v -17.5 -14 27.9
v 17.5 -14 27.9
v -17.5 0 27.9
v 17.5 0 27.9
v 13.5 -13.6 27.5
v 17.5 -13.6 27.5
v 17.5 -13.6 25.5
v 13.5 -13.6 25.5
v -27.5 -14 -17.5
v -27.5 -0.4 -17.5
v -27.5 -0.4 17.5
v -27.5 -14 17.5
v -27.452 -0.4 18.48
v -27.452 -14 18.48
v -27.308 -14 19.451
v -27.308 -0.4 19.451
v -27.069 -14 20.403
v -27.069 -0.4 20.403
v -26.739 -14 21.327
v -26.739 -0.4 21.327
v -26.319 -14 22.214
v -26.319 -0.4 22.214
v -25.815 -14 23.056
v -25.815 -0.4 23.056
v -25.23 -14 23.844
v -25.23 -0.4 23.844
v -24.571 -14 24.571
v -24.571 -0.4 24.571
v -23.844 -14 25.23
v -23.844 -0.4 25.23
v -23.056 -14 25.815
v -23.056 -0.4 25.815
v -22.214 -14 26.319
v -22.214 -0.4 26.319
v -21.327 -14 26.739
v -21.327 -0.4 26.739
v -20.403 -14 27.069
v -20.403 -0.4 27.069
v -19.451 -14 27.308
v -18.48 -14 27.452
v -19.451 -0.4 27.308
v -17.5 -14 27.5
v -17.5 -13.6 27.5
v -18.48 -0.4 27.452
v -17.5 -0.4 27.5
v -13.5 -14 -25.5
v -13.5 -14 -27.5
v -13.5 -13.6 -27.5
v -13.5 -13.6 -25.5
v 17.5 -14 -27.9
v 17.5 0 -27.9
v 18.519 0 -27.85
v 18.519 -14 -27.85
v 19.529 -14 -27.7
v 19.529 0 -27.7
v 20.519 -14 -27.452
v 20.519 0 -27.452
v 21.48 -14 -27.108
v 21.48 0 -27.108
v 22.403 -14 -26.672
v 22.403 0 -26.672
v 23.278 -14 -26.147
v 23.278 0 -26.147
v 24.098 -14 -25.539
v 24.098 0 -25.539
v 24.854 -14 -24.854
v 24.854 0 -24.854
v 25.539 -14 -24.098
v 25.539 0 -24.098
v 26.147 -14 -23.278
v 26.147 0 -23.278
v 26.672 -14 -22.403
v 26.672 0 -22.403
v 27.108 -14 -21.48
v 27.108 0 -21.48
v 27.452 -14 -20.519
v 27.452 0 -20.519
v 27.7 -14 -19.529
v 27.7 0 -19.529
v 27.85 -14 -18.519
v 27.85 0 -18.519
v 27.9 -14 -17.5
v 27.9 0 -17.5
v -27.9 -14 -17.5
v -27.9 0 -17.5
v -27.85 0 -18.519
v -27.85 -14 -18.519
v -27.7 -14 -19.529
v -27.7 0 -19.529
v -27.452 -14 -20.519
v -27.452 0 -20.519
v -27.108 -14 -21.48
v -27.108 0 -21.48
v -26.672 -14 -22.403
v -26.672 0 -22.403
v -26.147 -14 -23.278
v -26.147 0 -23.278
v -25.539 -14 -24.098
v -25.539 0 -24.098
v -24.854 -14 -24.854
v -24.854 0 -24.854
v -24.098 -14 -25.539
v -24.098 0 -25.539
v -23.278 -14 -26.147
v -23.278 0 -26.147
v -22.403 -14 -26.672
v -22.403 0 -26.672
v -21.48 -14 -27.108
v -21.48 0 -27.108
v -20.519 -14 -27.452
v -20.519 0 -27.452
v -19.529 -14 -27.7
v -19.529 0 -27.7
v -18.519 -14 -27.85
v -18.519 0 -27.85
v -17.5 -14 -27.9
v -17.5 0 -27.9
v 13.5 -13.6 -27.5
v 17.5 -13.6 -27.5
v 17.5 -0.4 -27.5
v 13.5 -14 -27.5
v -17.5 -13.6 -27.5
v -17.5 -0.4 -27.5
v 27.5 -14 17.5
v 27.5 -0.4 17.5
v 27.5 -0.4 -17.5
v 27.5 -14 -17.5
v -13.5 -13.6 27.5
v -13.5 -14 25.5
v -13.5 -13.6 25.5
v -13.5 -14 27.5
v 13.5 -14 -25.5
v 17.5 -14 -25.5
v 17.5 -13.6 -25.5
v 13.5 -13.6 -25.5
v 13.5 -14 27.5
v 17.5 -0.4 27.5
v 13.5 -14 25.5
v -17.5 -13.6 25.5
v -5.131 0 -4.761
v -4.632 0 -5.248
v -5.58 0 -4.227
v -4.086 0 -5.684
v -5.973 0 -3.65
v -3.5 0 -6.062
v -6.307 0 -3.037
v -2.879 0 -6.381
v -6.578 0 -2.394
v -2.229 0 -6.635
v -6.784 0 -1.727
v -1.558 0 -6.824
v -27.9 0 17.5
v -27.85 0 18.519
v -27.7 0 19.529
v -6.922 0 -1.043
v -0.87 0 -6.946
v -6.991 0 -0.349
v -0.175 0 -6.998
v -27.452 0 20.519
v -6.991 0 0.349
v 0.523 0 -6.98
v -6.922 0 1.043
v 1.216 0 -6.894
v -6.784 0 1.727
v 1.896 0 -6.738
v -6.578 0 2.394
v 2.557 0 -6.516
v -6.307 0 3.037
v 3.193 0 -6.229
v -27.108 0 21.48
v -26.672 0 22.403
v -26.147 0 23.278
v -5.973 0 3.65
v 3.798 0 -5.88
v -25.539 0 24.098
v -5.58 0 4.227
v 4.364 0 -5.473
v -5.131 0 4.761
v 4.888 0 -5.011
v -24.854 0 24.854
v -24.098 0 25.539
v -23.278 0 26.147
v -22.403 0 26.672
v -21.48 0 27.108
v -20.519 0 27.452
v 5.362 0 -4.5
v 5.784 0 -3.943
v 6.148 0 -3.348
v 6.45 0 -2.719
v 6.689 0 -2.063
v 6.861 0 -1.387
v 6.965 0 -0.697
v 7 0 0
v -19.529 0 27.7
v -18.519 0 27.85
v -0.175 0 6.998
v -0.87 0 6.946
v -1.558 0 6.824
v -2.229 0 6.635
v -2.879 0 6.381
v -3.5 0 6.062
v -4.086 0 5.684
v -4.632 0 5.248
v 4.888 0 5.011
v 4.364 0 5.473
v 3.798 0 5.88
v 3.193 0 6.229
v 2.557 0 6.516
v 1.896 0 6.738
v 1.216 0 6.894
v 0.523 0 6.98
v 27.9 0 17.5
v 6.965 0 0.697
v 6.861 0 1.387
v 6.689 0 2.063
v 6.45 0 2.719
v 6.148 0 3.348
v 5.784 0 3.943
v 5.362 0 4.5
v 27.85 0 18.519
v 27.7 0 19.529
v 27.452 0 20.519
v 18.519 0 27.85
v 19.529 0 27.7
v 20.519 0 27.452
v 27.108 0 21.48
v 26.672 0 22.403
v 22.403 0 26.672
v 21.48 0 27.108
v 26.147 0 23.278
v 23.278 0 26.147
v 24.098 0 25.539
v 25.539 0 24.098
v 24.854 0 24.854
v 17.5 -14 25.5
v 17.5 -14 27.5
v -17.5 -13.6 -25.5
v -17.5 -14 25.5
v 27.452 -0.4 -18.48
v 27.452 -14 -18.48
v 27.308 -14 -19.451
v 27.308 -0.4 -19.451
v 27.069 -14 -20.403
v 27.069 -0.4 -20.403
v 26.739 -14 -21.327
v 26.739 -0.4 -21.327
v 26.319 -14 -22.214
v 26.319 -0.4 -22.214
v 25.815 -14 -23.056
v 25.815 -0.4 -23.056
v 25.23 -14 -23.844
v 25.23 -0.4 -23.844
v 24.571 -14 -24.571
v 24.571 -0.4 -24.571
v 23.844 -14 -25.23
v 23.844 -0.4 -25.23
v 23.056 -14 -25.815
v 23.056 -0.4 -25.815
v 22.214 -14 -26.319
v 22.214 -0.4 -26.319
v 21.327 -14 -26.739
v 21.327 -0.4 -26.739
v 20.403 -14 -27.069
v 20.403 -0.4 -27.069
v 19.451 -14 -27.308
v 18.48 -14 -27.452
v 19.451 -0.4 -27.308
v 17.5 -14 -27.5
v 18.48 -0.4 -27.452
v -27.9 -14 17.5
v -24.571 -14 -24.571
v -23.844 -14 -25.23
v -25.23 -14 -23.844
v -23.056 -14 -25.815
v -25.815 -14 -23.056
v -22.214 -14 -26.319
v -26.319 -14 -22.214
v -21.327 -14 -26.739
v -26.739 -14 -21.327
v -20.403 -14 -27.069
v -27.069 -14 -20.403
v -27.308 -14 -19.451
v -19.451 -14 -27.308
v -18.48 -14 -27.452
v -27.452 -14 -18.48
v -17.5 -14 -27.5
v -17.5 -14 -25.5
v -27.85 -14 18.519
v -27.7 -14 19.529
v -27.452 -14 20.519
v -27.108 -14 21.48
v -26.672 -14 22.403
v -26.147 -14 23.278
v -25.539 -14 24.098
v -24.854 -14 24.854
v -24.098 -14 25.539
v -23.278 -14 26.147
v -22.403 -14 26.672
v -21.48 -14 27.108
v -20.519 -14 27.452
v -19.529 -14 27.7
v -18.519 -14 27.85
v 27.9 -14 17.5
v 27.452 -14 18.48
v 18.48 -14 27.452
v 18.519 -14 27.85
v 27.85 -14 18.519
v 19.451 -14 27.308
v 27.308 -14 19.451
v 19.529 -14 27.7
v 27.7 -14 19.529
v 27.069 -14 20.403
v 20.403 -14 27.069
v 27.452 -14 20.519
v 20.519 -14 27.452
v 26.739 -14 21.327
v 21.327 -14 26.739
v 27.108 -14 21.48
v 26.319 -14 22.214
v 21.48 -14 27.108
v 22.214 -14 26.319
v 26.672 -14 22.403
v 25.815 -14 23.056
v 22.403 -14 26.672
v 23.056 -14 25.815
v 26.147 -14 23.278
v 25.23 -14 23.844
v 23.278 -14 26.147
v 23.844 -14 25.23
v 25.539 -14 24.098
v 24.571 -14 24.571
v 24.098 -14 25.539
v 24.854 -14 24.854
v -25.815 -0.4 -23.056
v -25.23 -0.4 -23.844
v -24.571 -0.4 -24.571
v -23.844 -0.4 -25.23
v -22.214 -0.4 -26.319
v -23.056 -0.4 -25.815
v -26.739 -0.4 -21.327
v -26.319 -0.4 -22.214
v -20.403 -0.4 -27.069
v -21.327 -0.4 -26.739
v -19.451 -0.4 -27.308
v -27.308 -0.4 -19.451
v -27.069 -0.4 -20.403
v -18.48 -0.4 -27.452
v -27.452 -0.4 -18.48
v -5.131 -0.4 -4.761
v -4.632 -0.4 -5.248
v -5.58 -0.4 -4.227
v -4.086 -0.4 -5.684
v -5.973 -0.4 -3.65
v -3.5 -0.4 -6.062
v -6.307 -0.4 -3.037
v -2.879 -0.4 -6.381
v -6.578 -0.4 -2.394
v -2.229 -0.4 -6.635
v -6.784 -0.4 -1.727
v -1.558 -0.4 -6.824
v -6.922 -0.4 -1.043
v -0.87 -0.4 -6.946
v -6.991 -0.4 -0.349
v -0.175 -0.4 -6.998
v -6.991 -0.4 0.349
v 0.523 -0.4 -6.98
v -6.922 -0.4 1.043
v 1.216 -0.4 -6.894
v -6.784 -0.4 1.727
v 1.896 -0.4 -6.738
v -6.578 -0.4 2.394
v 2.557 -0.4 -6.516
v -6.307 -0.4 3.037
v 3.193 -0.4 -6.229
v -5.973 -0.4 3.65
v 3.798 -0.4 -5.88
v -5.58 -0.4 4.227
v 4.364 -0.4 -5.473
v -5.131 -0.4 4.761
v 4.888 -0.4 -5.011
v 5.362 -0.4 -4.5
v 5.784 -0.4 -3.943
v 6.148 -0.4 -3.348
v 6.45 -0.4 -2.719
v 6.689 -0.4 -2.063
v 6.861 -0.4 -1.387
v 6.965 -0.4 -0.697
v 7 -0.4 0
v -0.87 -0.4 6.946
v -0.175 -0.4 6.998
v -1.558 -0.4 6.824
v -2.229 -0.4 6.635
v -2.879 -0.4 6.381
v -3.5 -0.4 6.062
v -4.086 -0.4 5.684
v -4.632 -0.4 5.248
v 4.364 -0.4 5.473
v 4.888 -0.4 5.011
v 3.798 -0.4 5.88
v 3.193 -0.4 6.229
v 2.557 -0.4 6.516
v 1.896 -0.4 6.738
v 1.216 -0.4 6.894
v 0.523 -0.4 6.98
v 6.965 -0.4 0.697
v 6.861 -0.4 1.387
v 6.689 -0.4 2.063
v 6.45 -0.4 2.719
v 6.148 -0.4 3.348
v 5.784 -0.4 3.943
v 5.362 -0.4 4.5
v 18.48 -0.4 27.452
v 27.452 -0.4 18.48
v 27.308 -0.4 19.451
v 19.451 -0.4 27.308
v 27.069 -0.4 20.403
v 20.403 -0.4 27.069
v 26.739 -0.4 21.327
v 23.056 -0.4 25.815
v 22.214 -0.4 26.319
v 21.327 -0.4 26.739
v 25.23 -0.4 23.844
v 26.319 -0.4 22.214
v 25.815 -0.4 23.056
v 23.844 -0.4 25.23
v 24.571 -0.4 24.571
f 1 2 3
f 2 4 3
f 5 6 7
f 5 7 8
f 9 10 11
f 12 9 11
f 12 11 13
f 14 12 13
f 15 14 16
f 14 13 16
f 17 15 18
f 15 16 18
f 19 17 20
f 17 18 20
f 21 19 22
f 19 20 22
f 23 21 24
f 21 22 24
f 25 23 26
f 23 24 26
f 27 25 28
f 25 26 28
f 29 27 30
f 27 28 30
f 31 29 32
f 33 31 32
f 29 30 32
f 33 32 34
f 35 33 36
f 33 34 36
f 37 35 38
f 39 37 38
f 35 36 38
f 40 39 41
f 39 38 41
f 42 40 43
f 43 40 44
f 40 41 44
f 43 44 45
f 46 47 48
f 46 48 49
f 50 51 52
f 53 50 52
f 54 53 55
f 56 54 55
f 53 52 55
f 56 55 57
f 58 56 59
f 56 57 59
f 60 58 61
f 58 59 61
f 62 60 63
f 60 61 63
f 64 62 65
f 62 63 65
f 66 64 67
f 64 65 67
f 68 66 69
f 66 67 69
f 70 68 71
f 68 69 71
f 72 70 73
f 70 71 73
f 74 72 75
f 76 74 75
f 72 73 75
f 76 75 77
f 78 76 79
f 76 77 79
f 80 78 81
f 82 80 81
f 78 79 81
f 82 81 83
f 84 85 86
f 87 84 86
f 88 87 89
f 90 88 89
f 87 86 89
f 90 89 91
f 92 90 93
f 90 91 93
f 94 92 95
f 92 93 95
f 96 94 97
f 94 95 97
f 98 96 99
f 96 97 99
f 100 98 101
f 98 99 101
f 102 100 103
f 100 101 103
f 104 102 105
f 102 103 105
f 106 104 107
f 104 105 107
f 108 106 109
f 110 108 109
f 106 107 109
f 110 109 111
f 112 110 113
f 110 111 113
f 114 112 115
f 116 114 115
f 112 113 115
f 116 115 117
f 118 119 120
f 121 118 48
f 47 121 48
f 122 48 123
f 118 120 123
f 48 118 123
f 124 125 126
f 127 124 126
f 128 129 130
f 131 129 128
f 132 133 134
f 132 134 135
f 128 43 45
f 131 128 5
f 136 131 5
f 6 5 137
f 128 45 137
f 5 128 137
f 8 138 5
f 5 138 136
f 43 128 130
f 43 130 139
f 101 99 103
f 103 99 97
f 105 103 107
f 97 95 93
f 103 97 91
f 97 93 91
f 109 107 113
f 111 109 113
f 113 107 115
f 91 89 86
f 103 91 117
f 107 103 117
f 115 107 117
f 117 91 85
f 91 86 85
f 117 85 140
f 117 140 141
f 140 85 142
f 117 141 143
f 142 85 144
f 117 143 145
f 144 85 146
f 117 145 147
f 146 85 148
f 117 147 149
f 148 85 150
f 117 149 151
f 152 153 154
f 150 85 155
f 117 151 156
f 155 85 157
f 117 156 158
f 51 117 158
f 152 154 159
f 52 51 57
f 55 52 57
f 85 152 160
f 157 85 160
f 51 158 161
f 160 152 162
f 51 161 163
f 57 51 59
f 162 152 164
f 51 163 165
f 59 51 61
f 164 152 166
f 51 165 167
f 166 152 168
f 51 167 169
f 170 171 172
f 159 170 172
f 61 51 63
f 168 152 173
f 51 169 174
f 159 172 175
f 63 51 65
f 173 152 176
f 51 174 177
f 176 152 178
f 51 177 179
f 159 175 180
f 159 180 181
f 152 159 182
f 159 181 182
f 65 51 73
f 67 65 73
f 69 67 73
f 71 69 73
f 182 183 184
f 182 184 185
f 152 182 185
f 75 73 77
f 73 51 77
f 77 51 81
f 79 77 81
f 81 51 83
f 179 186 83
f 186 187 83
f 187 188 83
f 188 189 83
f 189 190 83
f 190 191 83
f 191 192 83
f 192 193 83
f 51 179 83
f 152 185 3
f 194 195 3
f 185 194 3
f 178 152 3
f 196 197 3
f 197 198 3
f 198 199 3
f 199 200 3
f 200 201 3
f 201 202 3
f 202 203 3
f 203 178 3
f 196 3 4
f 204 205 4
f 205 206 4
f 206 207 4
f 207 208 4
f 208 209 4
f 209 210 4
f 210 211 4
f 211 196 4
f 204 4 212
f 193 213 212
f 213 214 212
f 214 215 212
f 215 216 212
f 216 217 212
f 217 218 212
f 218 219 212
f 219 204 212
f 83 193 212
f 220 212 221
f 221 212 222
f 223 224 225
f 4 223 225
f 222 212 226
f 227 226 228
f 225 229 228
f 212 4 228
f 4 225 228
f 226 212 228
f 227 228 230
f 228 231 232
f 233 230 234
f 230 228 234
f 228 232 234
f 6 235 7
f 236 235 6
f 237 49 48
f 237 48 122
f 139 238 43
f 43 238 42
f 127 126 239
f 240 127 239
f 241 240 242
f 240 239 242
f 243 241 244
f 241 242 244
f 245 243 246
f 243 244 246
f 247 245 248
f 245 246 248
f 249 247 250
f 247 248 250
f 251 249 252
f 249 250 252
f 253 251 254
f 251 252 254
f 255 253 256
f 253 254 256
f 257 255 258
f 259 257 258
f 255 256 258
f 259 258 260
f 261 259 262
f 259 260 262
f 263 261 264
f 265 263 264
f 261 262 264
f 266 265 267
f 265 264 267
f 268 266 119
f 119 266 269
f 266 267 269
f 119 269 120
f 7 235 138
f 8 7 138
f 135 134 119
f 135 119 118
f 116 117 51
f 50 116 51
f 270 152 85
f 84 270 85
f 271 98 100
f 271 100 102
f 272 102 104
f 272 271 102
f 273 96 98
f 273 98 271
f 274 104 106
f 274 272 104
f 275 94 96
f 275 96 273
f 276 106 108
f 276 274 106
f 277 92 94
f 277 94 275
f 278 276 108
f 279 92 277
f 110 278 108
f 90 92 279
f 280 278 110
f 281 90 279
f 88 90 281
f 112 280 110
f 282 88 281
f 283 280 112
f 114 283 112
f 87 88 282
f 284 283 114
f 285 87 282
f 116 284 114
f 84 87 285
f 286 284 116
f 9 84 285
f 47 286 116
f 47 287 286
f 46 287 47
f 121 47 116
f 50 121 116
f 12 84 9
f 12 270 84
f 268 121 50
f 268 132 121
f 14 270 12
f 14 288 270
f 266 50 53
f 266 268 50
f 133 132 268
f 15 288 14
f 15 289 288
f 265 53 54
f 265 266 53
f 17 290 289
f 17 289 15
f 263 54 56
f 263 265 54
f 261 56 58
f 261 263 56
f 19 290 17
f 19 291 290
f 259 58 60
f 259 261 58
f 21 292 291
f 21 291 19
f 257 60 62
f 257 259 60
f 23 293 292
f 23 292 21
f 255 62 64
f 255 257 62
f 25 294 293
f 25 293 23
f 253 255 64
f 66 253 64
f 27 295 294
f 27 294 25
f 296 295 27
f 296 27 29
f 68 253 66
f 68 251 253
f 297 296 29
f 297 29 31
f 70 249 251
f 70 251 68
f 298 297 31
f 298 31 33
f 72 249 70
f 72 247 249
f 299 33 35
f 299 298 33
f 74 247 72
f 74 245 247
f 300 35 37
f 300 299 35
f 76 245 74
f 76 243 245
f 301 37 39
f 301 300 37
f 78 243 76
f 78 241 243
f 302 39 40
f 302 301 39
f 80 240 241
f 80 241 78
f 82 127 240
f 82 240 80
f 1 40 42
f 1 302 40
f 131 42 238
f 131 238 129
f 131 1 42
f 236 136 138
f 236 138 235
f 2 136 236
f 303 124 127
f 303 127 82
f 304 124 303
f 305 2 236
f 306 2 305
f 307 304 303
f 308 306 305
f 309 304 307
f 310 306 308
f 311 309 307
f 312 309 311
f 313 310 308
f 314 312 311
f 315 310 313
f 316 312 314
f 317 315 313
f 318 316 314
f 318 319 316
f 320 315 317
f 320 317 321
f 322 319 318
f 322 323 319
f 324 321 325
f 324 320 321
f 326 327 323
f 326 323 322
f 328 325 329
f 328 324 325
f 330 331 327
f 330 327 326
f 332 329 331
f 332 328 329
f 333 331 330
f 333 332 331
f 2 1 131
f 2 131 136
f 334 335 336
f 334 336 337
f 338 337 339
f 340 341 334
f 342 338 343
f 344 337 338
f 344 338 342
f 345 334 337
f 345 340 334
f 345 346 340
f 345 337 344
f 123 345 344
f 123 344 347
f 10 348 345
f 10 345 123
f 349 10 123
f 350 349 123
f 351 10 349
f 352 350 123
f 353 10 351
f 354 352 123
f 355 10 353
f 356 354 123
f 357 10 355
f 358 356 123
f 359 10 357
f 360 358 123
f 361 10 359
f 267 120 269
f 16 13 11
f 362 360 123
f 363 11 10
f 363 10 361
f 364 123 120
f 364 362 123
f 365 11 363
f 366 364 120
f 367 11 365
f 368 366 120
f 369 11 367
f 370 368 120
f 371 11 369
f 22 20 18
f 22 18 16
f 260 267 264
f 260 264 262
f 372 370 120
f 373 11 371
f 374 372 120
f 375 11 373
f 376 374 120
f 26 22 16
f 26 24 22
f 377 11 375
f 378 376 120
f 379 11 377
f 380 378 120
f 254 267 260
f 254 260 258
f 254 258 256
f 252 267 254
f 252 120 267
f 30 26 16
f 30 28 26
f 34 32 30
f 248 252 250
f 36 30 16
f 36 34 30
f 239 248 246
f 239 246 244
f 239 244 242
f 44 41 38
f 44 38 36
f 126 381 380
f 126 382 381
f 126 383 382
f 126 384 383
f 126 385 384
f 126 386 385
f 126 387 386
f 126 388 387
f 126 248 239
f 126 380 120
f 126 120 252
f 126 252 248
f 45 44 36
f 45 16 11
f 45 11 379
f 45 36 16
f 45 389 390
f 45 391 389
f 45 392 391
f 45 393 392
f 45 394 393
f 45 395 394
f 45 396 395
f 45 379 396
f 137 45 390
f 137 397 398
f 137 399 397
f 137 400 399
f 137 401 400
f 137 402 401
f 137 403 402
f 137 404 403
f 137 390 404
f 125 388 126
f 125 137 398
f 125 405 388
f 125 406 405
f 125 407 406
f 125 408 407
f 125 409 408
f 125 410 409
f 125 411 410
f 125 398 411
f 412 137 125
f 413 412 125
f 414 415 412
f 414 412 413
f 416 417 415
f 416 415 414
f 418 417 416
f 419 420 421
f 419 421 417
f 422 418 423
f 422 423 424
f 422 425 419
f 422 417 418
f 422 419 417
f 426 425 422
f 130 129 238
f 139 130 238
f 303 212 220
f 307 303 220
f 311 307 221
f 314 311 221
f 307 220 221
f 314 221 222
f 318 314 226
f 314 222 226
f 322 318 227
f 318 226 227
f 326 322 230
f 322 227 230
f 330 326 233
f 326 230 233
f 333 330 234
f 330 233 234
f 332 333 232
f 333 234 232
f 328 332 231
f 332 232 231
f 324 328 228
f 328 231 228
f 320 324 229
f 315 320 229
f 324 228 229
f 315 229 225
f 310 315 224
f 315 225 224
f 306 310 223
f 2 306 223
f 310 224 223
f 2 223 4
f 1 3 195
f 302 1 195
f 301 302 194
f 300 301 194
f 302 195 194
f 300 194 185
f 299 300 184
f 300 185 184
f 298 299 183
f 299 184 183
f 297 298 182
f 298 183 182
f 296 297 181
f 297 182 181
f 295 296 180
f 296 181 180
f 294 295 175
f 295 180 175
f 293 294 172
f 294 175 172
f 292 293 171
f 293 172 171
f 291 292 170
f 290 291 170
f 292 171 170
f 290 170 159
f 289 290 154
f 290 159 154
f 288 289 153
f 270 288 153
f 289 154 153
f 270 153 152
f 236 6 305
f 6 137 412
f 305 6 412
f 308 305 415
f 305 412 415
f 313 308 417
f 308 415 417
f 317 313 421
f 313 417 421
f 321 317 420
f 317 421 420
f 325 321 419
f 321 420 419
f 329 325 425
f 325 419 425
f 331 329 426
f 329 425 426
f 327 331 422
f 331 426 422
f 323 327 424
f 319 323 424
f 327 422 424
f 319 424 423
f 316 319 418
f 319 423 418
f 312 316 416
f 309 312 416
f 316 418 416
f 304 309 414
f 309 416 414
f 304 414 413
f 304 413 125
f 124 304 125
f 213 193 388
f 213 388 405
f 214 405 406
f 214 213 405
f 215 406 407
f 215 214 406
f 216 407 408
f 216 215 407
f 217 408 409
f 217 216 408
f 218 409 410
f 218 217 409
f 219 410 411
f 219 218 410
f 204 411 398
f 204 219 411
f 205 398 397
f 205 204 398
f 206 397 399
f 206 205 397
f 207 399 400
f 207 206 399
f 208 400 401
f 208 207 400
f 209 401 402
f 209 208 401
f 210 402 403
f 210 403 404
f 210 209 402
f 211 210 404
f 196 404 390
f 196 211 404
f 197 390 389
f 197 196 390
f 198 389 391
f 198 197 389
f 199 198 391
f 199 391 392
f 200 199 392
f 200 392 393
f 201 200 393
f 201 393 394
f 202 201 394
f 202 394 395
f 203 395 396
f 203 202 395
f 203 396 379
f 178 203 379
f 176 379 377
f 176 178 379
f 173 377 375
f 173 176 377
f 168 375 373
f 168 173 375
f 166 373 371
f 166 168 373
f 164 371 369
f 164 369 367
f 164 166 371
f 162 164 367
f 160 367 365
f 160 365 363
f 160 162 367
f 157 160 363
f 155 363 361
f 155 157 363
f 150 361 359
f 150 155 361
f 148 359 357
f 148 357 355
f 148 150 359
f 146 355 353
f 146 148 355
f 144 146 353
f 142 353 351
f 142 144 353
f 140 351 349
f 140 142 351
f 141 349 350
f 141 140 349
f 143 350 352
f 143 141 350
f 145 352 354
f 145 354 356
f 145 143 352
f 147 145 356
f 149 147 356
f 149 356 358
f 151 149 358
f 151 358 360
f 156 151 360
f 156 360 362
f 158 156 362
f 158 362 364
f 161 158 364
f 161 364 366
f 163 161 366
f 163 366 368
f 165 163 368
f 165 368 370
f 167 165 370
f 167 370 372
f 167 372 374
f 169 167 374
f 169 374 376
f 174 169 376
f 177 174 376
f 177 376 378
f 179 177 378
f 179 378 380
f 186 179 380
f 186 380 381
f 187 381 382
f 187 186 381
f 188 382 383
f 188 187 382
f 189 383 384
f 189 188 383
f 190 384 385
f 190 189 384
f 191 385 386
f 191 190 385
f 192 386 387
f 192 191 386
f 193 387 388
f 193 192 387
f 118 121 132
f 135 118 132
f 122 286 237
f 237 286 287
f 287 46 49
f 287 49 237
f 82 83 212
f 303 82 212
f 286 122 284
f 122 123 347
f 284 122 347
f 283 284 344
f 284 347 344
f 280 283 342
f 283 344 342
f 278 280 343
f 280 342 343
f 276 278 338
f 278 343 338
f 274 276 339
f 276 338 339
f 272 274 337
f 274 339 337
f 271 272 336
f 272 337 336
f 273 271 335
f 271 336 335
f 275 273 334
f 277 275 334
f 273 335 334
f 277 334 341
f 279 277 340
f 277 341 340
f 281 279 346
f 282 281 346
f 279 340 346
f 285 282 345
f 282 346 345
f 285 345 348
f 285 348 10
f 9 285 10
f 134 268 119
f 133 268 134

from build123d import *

# Parameters (mm, degrees)
F0_R     = 7
F1_DEPTH = 0.4
F3_DEPTH = 14
F5_W     = 4
F5_H     = 2.4
F6_DEPTH = 0.4


with BuildPart() as f1:
    # F0 (on Front) → F1 (new body)
    with BuildSketch(Plane.XZ):
        with BuildLine():
            Line((-17.5, -27.5), (17.5, -27.5))
            ThreePointArc((17.5, -27.5), (24.571068, -24.571068), (27.5, -17.5))
            Line((27.5, -17.5), (27.5, 17.5))
            ThreePointArc((27.5, 17.5), (24.571068, 24.571068), (17.5, 27.5))
            Line((17.5, 27.5), (-17.5, 27.5))
            ThreePointArc((-17.5, 27.5), (-24.571068, 24.571068), (-27.5, 17.5))
            Line((-27.5, 17.5), (-27.5, -17.5))
            ThreePointArc((-27.5, -17.5), (-24.571068, -24.571068), (-17.5, -27.5))
        make_face()
        Circle(F0_R, mode=Mode.SUBTRACT)
    extrude(amount=F1_DEPTH)

    # F2 (on Front) → F3 (join)
    with BuildSketch(Plane.XZ):
        with BuildLine():
            ThreePointArc((27.9, 17.5), (24.853911, 24.853911), (17.5, 27.9))
            Line((17.5, 27.9), (-17.5, 27.9))
            ThreePointArc((-17.5, 27.9), (-24.853911, 24.853911), (-27.9, 17.5))
            Line((-27.9, 17.5), (-27.9, -17.5))
            ThreePointArc((-27.9, -17.5), (-24.853911, -24.853911), (-17.5, -27.9))
            Line((-17.5, -27.9), (17.5, -27.9))
            ThreePointArc((17.5, -27.9), (24.853911, -24.853911), (27.9, -17.5))
            Line((27.9, -17.5), (27.9, 17.5))
        make_face()
        with BuildLine():
            ThreePointArc((27.5, -17.5), (24.571068, -24.571068), (17.5, -27.5))
            Line((17.5, -27.5), (-17.5, -27.5))
            ThreePointArc((-17.5, -27.5), (-24.571068, -24.571068), (-27.5, -17.5))
            Line((-27.5, -17.5), (-27.5, 17.5))
            ThreePointArc((-27.5, 17.5), (-24.571068, 24.571068), (-17.5, 27.5))
            Line((-17.5, 27.5), (17.5, 27.5))
            ThreePointArc((17.5, 27.5), (24.571068, 24.571068), (27.5, 17.5))
            Line((27.5, 17.5), (27.5, -17.5))
        make_face(mode=Mode.SUBTRACT)
    extrude(amount=F3_DEPTH)

    # F5 (on face) → F6 (join)
    with BuildSketch(Plane(origin=(0, -14, 0), x_dir=(-1, 0, 0), z_dir=(0, 1, 0))):
        with Locations((-15.5, -26.7)):
            Rectangle(F5_W, F5_H)
        with Locations((15.5, -26.7)):
            Rectangle(F5_W, F5_H)
        with Locations((15.5, 26.7)):
            Rectangle(F5_W, F5_H)
        with Locations((-15.5, 26.7)):
            Rectangle(F5_W, F5_H)
    extrude(amount=F6_DEPTH)


solid = f1.part
